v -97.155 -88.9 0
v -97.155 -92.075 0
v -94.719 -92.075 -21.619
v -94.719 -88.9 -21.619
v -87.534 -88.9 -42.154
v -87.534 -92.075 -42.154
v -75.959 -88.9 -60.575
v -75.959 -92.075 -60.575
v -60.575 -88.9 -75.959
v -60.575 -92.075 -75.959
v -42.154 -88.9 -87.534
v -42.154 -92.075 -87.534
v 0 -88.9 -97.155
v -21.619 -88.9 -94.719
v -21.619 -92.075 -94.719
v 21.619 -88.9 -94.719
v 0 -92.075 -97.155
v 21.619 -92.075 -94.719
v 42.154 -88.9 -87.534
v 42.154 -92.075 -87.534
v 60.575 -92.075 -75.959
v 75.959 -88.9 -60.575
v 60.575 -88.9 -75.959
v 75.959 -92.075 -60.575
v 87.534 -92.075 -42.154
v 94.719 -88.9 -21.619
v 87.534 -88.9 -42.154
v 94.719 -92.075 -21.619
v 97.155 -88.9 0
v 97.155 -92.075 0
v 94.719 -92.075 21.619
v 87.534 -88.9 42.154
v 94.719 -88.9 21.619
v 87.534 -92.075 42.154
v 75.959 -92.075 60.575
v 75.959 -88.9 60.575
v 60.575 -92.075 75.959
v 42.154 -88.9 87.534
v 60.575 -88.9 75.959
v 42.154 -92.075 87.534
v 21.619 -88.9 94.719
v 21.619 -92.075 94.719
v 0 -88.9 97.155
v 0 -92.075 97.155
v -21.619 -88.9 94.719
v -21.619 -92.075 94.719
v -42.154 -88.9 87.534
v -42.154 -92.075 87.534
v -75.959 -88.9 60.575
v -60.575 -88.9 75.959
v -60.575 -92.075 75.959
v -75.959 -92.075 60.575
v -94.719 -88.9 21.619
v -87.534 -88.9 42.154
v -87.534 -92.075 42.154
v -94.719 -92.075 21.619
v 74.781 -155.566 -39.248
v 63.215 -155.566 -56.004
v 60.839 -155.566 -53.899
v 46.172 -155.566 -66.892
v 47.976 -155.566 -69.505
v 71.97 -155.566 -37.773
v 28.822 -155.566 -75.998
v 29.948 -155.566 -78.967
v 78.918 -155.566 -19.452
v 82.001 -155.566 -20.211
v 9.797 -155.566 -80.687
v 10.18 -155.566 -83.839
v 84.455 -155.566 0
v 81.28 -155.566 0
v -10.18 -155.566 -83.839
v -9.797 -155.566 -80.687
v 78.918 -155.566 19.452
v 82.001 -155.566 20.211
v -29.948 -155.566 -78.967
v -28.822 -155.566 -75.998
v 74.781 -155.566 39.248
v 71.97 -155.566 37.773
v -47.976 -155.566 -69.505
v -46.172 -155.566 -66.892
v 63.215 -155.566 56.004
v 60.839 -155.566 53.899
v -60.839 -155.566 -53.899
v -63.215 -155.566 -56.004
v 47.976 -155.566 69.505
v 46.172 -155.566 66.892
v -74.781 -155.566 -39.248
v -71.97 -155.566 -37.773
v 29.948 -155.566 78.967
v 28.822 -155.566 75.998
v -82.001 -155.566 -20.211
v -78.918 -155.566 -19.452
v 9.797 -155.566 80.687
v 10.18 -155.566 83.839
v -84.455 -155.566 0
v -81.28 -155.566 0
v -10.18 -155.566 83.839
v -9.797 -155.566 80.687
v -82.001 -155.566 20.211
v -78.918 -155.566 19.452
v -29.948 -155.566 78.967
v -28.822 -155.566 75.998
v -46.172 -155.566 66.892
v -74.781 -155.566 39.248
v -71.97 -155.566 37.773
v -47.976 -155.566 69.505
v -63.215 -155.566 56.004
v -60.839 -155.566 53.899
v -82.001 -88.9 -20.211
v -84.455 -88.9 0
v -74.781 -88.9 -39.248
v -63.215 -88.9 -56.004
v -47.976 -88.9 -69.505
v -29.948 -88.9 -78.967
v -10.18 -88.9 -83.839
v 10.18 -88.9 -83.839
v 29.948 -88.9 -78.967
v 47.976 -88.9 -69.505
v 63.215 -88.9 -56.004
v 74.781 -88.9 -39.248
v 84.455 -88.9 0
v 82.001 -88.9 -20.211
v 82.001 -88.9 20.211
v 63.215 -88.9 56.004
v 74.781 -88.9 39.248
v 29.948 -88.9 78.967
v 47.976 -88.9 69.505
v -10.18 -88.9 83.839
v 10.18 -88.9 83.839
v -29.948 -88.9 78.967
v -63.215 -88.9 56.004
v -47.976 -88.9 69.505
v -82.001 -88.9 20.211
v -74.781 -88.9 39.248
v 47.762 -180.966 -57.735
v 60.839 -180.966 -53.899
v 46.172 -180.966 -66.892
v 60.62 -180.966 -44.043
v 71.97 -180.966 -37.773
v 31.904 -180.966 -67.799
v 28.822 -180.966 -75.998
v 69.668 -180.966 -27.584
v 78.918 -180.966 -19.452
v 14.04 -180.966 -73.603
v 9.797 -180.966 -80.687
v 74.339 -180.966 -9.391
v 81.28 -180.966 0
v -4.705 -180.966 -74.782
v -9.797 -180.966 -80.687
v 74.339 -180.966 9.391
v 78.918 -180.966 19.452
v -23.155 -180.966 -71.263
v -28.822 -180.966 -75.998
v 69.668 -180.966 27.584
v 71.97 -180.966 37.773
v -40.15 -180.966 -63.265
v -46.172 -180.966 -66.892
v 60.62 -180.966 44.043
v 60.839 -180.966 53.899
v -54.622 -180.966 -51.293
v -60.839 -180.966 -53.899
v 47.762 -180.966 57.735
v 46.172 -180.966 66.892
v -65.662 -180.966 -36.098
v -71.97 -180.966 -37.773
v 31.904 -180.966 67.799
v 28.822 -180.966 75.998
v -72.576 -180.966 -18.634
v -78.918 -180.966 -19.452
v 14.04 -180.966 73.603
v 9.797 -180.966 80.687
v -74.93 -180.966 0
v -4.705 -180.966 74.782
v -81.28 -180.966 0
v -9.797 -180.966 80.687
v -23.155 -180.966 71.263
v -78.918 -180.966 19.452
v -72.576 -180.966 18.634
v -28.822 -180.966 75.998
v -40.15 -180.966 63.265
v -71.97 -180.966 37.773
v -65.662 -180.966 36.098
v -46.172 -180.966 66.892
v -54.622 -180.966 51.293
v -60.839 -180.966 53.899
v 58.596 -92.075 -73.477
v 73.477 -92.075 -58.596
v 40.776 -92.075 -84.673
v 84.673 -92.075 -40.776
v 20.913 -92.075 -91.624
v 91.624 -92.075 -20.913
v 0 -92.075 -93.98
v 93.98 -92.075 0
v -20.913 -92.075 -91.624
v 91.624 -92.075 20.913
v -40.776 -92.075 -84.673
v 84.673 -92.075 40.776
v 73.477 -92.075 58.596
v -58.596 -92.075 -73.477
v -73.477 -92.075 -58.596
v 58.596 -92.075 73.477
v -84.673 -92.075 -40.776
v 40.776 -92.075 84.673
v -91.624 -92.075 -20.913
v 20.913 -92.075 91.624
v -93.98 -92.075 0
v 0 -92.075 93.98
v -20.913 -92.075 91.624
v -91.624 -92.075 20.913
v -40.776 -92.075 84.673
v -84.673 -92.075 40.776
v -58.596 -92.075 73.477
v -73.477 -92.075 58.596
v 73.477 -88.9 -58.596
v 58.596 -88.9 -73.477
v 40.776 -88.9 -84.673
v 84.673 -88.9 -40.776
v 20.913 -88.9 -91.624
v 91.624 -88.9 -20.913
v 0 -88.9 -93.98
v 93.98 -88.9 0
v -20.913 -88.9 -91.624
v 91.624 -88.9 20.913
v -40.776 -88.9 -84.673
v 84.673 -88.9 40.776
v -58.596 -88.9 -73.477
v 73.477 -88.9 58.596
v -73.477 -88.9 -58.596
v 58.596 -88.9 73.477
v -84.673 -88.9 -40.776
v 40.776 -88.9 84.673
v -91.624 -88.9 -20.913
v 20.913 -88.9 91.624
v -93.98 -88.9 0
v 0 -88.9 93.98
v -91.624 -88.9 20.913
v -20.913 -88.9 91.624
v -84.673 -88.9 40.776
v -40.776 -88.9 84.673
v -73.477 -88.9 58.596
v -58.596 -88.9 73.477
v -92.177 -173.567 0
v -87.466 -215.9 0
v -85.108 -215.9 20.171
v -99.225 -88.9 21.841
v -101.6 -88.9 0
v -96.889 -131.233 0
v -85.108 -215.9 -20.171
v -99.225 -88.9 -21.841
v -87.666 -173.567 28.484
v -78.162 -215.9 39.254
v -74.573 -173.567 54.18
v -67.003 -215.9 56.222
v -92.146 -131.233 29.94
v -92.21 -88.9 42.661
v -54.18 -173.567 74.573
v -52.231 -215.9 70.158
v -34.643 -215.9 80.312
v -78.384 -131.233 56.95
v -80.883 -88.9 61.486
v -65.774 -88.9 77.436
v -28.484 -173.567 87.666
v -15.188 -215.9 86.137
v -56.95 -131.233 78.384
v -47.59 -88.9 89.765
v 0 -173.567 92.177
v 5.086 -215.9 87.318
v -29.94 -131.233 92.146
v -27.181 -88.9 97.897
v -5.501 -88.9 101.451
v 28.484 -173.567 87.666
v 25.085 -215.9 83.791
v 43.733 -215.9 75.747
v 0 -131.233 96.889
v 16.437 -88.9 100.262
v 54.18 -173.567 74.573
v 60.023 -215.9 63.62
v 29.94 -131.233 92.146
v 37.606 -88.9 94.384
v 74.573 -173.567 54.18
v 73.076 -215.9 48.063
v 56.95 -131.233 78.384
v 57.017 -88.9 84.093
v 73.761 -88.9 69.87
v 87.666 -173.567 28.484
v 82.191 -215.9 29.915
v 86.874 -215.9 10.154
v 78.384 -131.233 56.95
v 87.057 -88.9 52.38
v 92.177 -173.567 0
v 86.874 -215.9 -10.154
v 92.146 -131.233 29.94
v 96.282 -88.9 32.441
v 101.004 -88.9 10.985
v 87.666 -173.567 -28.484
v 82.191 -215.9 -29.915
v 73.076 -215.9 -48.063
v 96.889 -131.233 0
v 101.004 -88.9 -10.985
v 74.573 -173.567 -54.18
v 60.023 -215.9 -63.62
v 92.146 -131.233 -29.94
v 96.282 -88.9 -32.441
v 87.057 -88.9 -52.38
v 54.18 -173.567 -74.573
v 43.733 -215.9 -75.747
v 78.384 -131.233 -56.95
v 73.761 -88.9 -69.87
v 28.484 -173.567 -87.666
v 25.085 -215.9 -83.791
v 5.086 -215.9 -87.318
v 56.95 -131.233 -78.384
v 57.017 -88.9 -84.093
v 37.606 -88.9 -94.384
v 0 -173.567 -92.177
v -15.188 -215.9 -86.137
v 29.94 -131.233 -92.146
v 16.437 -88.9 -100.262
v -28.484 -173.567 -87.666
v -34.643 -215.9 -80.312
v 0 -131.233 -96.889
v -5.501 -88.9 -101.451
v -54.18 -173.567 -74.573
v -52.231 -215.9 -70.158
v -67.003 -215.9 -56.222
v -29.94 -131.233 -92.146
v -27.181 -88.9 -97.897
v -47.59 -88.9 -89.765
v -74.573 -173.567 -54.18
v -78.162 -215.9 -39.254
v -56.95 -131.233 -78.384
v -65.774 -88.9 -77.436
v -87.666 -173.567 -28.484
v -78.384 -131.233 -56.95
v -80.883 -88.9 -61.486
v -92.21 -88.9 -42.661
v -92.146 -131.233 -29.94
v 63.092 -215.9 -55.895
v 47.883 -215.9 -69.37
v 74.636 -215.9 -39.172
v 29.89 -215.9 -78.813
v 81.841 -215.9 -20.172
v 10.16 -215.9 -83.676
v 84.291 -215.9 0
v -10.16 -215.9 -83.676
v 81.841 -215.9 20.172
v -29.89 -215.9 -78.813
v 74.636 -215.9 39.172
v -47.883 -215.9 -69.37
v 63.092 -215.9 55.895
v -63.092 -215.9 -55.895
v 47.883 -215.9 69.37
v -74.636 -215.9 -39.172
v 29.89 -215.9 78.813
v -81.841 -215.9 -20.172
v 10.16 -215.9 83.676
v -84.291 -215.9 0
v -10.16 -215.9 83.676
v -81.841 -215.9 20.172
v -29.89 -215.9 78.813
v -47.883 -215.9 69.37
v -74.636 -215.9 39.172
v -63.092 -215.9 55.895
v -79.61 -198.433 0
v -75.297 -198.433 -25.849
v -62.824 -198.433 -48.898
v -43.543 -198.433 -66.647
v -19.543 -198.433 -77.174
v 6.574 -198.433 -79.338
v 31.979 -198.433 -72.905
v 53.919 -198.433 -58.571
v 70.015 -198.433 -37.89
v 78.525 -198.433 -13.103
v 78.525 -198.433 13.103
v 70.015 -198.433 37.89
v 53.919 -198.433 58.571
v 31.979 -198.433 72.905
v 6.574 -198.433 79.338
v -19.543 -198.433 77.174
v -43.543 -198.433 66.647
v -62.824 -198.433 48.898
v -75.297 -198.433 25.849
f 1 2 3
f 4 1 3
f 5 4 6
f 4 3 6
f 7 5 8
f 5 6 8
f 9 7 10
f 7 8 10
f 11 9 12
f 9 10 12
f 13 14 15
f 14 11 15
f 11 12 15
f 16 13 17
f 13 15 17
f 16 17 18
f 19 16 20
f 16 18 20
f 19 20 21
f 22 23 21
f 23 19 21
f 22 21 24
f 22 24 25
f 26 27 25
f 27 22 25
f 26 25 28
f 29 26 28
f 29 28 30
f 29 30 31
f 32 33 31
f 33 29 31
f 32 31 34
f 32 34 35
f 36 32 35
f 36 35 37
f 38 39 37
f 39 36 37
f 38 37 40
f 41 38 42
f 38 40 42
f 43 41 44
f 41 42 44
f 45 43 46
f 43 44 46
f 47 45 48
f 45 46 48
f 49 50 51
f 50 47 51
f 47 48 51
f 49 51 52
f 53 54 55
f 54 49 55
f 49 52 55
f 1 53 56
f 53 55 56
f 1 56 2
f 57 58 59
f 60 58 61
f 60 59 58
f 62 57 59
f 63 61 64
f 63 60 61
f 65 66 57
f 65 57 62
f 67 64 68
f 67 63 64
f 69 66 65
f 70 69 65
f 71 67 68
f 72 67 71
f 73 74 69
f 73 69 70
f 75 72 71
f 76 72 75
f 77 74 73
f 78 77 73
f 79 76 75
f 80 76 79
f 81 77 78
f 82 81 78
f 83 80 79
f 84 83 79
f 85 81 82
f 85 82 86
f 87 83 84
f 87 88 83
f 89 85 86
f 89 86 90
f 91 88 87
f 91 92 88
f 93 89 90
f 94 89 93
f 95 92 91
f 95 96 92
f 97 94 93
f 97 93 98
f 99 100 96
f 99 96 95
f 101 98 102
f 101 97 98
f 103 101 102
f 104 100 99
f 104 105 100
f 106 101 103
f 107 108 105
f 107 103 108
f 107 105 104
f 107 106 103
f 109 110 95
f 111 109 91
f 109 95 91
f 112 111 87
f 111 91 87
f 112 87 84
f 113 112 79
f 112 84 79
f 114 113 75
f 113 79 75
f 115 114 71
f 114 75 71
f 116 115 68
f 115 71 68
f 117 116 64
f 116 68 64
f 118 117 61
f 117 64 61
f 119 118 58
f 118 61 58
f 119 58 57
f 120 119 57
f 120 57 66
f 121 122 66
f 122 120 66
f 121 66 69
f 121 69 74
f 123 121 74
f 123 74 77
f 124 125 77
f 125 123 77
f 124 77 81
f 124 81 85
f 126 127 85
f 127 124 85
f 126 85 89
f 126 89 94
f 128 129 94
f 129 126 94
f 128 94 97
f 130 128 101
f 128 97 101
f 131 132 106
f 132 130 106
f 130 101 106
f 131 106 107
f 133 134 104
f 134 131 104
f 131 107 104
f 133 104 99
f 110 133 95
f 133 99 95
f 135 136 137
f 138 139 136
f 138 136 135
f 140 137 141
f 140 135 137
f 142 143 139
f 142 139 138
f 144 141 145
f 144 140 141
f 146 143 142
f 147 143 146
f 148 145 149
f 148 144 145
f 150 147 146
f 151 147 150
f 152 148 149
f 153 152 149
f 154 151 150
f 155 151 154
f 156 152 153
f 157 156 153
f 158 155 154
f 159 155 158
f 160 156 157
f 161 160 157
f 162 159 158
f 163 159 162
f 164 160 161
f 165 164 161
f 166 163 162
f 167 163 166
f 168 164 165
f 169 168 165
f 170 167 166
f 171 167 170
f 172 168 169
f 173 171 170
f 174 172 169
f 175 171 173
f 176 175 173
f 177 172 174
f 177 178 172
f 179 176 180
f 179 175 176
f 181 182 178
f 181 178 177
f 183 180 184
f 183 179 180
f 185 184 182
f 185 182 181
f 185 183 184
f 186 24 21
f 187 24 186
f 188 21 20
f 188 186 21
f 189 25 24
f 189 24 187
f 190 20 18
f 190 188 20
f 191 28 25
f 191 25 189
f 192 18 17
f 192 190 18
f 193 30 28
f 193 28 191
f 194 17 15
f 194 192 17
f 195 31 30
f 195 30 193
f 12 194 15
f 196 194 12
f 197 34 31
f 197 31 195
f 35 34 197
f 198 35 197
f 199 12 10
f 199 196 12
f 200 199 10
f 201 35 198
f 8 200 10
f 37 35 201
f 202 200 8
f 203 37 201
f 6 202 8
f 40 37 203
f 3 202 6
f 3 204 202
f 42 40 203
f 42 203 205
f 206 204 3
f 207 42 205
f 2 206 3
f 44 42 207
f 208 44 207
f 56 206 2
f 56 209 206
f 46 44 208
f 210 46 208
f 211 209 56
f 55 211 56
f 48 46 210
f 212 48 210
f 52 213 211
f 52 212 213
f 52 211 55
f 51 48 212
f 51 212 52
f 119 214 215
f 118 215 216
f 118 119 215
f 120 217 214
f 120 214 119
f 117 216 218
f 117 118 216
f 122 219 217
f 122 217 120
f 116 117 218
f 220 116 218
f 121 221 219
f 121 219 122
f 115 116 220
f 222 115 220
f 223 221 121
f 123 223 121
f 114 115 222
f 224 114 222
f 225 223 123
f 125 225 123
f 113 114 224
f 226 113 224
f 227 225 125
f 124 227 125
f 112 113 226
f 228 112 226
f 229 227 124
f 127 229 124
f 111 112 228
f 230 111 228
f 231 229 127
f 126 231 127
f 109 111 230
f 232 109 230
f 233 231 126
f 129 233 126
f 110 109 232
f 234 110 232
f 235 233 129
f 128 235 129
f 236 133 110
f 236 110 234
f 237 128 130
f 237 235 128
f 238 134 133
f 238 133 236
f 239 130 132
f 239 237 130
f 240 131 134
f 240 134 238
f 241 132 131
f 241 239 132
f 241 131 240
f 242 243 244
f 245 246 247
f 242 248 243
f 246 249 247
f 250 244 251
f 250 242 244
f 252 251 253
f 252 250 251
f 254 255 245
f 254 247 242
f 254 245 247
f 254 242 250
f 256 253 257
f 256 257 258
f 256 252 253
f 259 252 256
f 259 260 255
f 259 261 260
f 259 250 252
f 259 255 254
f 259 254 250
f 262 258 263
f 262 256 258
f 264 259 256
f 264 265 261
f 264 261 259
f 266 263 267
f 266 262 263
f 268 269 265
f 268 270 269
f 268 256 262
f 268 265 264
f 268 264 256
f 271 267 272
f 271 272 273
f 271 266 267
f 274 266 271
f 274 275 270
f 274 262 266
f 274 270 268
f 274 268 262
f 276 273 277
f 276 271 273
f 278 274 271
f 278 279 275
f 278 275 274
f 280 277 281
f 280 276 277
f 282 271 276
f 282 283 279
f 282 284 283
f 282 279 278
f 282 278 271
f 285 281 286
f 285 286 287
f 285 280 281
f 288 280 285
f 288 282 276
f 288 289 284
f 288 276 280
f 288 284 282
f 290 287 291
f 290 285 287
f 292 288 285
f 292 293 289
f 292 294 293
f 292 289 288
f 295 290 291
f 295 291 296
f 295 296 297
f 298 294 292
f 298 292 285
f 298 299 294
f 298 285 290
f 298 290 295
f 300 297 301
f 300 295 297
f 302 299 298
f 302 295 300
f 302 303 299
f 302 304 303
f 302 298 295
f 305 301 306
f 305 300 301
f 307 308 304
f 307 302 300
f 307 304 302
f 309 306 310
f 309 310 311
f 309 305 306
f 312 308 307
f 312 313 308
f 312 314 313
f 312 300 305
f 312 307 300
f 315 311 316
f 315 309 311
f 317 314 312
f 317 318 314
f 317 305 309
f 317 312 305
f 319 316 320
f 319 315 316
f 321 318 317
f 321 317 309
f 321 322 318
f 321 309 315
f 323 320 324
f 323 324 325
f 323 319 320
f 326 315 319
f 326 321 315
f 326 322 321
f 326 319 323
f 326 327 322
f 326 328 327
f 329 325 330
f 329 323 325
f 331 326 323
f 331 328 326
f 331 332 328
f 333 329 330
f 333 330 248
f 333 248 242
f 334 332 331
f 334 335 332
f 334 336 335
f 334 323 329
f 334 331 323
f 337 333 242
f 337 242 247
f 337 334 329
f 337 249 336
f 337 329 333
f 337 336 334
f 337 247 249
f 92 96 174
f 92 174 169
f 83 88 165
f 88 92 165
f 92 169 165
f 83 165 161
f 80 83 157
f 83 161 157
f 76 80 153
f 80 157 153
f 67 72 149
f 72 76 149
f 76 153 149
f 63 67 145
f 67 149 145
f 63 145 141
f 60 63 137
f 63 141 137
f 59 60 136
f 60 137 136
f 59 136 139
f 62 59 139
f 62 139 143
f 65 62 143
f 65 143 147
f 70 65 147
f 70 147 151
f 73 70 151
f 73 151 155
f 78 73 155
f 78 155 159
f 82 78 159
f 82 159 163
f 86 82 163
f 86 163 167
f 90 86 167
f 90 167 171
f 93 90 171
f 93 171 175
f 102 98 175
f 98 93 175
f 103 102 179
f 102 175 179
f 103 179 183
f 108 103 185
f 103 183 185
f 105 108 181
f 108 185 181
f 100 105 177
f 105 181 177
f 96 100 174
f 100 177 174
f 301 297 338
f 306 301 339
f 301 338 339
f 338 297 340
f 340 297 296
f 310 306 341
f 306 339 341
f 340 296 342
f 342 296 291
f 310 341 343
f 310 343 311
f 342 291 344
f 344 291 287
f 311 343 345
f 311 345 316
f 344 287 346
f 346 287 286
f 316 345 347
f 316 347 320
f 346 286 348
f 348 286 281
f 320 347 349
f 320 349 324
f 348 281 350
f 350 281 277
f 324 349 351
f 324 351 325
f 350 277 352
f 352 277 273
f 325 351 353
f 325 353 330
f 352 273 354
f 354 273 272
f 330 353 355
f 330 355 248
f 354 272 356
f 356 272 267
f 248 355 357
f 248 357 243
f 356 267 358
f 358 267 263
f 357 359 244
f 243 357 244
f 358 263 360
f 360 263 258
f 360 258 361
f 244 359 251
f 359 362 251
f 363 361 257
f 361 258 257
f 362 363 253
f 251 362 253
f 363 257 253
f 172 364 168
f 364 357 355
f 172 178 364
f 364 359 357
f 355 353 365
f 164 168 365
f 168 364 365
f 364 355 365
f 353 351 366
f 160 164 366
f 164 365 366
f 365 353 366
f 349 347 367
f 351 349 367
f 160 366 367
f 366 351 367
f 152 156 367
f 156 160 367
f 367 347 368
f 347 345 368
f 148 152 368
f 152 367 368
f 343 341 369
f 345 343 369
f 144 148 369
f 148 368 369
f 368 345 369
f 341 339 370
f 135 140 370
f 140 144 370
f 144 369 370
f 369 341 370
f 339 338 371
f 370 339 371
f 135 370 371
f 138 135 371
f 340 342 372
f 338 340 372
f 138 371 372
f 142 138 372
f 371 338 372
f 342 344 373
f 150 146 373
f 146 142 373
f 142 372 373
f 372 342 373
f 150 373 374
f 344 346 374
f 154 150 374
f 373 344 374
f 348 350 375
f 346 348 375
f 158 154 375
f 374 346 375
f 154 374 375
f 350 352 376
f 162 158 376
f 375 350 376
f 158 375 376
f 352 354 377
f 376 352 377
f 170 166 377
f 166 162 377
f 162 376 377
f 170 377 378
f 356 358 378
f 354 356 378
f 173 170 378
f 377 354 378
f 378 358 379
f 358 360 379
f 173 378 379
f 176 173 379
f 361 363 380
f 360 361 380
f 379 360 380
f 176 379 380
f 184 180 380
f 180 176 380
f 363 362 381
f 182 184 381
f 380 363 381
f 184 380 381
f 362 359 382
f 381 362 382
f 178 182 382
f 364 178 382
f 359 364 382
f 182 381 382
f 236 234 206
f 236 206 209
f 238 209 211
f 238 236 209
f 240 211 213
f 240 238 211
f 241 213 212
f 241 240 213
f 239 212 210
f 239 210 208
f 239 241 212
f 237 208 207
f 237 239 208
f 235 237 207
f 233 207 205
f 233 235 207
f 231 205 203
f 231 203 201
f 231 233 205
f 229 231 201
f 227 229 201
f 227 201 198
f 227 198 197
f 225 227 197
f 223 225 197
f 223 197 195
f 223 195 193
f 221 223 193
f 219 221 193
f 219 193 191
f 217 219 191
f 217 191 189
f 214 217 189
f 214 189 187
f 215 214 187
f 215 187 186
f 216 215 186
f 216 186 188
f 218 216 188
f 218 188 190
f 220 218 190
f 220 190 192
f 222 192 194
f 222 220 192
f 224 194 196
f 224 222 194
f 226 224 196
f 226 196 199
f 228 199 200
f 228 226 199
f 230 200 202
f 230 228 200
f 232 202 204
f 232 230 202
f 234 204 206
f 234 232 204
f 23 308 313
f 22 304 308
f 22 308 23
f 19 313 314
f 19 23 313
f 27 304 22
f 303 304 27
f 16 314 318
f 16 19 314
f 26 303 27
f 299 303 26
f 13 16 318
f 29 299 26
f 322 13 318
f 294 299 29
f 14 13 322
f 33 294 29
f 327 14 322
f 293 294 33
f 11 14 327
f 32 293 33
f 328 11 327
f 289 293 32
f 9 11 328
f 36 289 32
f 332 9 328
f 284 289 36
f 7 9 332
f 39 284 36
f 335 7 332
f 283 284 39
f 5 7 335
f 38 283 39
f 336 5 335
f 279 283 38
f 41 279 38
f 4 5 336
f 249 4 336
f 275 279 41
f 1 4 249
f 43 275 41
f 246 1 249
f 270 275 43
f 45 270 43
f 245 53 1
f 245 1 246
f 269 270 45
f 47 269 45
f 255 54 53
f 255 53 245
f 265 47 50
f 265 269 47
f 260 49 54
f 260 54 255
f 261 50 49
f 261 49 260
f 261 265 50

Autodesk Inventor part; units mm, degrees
ref_plane "YZ Plane" through (0, 0, 0) normal (1, 0, 0) x (0, 1, 0)
ref_plane "XZ Plane" through (0, 0, 0) normal (0, 1, 0) x (-1, 0, 0)
ref_plane "XY Plane" through (0, 0, 0) normal (0, 0, 1) x (1, 0, 0)
sketch "Sketch1" plane through (0, 0, 0) normal (0, 0, 1) x (1, 0, 0)
  line L0 (0, 25.4) -> (-28.702, 25.4) construction
  line L1 (0, 25.4) -> (-93.98, 25.4) construction
  line L2 (-93.98, 25.4) -> (-90.805, 25.4) construction
  line L3 (-90.805, 25.4) -> (-84.455, 22.4389) construction
  line L4 (-90.805, 25.4) -> (-90.805, 22.4389) construction
  line L5 (-90.805, 0) -> (-93.98, 0)
  line L6 (-28.702, 59.6457) -> (-28.702, -91.9304) construction
  arc A0 (-28.9184, -9.248) -> (-32.3684, -1.8494) centre (-35.052, -7.6045) ccw
  line L7 (-74.93, -180.9657) -> (-28.702, -8.4405)
  line L8 (-90.805, 25.4) -> (-90.805, 0)
  line L9 (-90.805, 25.4) -> (-32.3684, -1.8494)
  line L10 (-28.702, -7.6045) -> (-60.452, -7.6045) construction
  line L11 (-60.452, -126.9331) -> (-54.102, -126.9331) construction
  line L12 (-54.102, -126.9331) -> (-54.102, -103.2346) construction
  line L13 (-54.102, -103.2346) -> (-60.452, -103.2346)
  line L14 (-60.452, 11.2462) -> (-60.452, 1.7212) construction
  line L15 (-60.452, 11.2462) -> (-60.452, 4.7154) construction
  line L16 (-60.452, 4.7154) -> (-46.4468, 4.7154)
  line L17 (-93.98, 0) -> (-93.98, -12.7) construction
  line L18 (-60.452, -12.7) -> (-73.152, -12.7) construction
  line L19 (-93.98, -12.7) -> (-93.98, -25.4) construction
  line L20 (-93.98, -25.4) -> (-93.98, -88.9) construction
  line L21 (-93.98, -88.9) -> (-81.28, -88.9) construction
  line L22 (-81.28, -88.9) -> (-81.28, -25.4) construction
  line L23 (-93.98, -25.4) -> (-81.28, -25.4)
  line L24 (-81.28, -25.4) -> (-81.28, -88.9)
  line L25 (-81.28, -88.9) -> (-93.98, -88.9)
  line L26 (-93.98, -12.7) -> (-73.152, -12.7)
  line L27 (-73.152, -138.7824) -> (-63.627, -138.7824)
  line L28 (-81.28, -88.9) -> (-81.28, -180.9657)
  line L29 (-81.28, -180.9657) -> (-74.93, -180.9657)
  line L30 (-73.152, -12.7) -> (-73.152, -138.7824)
  line L31 (-87.63, -25.4) -> (-87.63, -31.3436)
  line L32 (-87.63, -31.3436) -> (-93.98, -31.3436)
  line L33 (-93.98, 0) -> (-93.98, -25.4)
  line L34 (-93.98, -31.3436) -> (-93.98, -88.9)
  line L35 (-28.9184, -9.248) -> (-84.2906, -215.9)
  line L36 (-84.2906, -215.9) -> (-87.4656, -215.9)
  line L37 (-66.802, -38.1) -> (-73.152, -38.1)
  line L38 (-66.802, -38.1) -> (-66.802, 4.7154)
  line L39 (-66.802, 4.7154) -> (-60.452, 4.7154)
  line L40 (-66.802, -38.1) -> (-60.452, -103.2346)
  line L41 (-60.452, 11.2462) -> (-60.452, 4.7154) construction
  line L42 (-60.452, -7.6045) -> (-60.452, -12.7) construction
  line L43 (-60.452, -103.2346) -> (-60.452, -126.9331) construction
  line L44 (0, -319.0244) -> (0, 122.7573) projected
  line L45 (0, -88.9) -> (-101.6, -88.9) construction
  line L46 (-101.6, -88.9) -> (-87.4656, -215.9)
  line L47 (-97.155, -88.9) -> (-97.155, -92.075)
  line L48 (-97.155, -92.075) -> (-93.98, -92.075)
  line L49 (-93.98, -92.075) -> (-93.98, -88.9)
  line L50 (-101.6, -88.9) -> (-97.155, -88.9)
  line L51 (-93.98, -88.9) -> (-81.28, -88.9)
  line L52 (-84.455, -88.9) -> (-84.455, -155.5657)
  line L53 (-84.455, -155.5657) -> (-81.28, -155.5657)
  point P0 (0, 0)
  point P1 (-93.98, -255.9127)
  point P2 (-88.7095, 22.4389)
  dimension "d0" = 28.702
  dimension "d1" = 93.98
  dimension "d2" = 3.175
  dimension "d3" = 25
  dimension "d5" = 25.4
  dimension "d6" = 25.4
  dimension "d8" = 12.7
  dimension "d12" = 31.75
  dimension "d13" = 6.35
  dimension "d16" = 12.7
  dimension "d17" = 12.7
  dimension "d18" = 12.7
  dimension "d19" = 63.5
  dimension "d20" = 12.7
  dimension "d22" = 9.525
  dimension "d23" = 6.35
  dimension "d25" = 5.9436
  dimension "d27" = 3.175
  dimension "d30" = 107.95
  dimension "d31" = 6.35
  dimension "d32" = 25.4
  dimension "d33" = 20.3552
  dimension "d34" = 15
  dimension "d36" = 101.6
  dimension "d37" = 127
  dimension "d38" = 3.175
  dimension "d39" = 3.175
  dimension "d42" = 3.175
  dimension "d43" = 25.4
revolve "Revolution2" add sketch "Sketch1" angle 360 about axis through (0, -10, 0) along (0, 1, 0) contours L35 L36 L46 L50 L47 L48 L49 L25 L52 L53 L28 L29
thread "Thread1" size "10-24 UNC" class "2B" standard "ANSI Unified Screw Threads" full length
properties part number "aluminum_skirt" material "Aluminum 6061"
